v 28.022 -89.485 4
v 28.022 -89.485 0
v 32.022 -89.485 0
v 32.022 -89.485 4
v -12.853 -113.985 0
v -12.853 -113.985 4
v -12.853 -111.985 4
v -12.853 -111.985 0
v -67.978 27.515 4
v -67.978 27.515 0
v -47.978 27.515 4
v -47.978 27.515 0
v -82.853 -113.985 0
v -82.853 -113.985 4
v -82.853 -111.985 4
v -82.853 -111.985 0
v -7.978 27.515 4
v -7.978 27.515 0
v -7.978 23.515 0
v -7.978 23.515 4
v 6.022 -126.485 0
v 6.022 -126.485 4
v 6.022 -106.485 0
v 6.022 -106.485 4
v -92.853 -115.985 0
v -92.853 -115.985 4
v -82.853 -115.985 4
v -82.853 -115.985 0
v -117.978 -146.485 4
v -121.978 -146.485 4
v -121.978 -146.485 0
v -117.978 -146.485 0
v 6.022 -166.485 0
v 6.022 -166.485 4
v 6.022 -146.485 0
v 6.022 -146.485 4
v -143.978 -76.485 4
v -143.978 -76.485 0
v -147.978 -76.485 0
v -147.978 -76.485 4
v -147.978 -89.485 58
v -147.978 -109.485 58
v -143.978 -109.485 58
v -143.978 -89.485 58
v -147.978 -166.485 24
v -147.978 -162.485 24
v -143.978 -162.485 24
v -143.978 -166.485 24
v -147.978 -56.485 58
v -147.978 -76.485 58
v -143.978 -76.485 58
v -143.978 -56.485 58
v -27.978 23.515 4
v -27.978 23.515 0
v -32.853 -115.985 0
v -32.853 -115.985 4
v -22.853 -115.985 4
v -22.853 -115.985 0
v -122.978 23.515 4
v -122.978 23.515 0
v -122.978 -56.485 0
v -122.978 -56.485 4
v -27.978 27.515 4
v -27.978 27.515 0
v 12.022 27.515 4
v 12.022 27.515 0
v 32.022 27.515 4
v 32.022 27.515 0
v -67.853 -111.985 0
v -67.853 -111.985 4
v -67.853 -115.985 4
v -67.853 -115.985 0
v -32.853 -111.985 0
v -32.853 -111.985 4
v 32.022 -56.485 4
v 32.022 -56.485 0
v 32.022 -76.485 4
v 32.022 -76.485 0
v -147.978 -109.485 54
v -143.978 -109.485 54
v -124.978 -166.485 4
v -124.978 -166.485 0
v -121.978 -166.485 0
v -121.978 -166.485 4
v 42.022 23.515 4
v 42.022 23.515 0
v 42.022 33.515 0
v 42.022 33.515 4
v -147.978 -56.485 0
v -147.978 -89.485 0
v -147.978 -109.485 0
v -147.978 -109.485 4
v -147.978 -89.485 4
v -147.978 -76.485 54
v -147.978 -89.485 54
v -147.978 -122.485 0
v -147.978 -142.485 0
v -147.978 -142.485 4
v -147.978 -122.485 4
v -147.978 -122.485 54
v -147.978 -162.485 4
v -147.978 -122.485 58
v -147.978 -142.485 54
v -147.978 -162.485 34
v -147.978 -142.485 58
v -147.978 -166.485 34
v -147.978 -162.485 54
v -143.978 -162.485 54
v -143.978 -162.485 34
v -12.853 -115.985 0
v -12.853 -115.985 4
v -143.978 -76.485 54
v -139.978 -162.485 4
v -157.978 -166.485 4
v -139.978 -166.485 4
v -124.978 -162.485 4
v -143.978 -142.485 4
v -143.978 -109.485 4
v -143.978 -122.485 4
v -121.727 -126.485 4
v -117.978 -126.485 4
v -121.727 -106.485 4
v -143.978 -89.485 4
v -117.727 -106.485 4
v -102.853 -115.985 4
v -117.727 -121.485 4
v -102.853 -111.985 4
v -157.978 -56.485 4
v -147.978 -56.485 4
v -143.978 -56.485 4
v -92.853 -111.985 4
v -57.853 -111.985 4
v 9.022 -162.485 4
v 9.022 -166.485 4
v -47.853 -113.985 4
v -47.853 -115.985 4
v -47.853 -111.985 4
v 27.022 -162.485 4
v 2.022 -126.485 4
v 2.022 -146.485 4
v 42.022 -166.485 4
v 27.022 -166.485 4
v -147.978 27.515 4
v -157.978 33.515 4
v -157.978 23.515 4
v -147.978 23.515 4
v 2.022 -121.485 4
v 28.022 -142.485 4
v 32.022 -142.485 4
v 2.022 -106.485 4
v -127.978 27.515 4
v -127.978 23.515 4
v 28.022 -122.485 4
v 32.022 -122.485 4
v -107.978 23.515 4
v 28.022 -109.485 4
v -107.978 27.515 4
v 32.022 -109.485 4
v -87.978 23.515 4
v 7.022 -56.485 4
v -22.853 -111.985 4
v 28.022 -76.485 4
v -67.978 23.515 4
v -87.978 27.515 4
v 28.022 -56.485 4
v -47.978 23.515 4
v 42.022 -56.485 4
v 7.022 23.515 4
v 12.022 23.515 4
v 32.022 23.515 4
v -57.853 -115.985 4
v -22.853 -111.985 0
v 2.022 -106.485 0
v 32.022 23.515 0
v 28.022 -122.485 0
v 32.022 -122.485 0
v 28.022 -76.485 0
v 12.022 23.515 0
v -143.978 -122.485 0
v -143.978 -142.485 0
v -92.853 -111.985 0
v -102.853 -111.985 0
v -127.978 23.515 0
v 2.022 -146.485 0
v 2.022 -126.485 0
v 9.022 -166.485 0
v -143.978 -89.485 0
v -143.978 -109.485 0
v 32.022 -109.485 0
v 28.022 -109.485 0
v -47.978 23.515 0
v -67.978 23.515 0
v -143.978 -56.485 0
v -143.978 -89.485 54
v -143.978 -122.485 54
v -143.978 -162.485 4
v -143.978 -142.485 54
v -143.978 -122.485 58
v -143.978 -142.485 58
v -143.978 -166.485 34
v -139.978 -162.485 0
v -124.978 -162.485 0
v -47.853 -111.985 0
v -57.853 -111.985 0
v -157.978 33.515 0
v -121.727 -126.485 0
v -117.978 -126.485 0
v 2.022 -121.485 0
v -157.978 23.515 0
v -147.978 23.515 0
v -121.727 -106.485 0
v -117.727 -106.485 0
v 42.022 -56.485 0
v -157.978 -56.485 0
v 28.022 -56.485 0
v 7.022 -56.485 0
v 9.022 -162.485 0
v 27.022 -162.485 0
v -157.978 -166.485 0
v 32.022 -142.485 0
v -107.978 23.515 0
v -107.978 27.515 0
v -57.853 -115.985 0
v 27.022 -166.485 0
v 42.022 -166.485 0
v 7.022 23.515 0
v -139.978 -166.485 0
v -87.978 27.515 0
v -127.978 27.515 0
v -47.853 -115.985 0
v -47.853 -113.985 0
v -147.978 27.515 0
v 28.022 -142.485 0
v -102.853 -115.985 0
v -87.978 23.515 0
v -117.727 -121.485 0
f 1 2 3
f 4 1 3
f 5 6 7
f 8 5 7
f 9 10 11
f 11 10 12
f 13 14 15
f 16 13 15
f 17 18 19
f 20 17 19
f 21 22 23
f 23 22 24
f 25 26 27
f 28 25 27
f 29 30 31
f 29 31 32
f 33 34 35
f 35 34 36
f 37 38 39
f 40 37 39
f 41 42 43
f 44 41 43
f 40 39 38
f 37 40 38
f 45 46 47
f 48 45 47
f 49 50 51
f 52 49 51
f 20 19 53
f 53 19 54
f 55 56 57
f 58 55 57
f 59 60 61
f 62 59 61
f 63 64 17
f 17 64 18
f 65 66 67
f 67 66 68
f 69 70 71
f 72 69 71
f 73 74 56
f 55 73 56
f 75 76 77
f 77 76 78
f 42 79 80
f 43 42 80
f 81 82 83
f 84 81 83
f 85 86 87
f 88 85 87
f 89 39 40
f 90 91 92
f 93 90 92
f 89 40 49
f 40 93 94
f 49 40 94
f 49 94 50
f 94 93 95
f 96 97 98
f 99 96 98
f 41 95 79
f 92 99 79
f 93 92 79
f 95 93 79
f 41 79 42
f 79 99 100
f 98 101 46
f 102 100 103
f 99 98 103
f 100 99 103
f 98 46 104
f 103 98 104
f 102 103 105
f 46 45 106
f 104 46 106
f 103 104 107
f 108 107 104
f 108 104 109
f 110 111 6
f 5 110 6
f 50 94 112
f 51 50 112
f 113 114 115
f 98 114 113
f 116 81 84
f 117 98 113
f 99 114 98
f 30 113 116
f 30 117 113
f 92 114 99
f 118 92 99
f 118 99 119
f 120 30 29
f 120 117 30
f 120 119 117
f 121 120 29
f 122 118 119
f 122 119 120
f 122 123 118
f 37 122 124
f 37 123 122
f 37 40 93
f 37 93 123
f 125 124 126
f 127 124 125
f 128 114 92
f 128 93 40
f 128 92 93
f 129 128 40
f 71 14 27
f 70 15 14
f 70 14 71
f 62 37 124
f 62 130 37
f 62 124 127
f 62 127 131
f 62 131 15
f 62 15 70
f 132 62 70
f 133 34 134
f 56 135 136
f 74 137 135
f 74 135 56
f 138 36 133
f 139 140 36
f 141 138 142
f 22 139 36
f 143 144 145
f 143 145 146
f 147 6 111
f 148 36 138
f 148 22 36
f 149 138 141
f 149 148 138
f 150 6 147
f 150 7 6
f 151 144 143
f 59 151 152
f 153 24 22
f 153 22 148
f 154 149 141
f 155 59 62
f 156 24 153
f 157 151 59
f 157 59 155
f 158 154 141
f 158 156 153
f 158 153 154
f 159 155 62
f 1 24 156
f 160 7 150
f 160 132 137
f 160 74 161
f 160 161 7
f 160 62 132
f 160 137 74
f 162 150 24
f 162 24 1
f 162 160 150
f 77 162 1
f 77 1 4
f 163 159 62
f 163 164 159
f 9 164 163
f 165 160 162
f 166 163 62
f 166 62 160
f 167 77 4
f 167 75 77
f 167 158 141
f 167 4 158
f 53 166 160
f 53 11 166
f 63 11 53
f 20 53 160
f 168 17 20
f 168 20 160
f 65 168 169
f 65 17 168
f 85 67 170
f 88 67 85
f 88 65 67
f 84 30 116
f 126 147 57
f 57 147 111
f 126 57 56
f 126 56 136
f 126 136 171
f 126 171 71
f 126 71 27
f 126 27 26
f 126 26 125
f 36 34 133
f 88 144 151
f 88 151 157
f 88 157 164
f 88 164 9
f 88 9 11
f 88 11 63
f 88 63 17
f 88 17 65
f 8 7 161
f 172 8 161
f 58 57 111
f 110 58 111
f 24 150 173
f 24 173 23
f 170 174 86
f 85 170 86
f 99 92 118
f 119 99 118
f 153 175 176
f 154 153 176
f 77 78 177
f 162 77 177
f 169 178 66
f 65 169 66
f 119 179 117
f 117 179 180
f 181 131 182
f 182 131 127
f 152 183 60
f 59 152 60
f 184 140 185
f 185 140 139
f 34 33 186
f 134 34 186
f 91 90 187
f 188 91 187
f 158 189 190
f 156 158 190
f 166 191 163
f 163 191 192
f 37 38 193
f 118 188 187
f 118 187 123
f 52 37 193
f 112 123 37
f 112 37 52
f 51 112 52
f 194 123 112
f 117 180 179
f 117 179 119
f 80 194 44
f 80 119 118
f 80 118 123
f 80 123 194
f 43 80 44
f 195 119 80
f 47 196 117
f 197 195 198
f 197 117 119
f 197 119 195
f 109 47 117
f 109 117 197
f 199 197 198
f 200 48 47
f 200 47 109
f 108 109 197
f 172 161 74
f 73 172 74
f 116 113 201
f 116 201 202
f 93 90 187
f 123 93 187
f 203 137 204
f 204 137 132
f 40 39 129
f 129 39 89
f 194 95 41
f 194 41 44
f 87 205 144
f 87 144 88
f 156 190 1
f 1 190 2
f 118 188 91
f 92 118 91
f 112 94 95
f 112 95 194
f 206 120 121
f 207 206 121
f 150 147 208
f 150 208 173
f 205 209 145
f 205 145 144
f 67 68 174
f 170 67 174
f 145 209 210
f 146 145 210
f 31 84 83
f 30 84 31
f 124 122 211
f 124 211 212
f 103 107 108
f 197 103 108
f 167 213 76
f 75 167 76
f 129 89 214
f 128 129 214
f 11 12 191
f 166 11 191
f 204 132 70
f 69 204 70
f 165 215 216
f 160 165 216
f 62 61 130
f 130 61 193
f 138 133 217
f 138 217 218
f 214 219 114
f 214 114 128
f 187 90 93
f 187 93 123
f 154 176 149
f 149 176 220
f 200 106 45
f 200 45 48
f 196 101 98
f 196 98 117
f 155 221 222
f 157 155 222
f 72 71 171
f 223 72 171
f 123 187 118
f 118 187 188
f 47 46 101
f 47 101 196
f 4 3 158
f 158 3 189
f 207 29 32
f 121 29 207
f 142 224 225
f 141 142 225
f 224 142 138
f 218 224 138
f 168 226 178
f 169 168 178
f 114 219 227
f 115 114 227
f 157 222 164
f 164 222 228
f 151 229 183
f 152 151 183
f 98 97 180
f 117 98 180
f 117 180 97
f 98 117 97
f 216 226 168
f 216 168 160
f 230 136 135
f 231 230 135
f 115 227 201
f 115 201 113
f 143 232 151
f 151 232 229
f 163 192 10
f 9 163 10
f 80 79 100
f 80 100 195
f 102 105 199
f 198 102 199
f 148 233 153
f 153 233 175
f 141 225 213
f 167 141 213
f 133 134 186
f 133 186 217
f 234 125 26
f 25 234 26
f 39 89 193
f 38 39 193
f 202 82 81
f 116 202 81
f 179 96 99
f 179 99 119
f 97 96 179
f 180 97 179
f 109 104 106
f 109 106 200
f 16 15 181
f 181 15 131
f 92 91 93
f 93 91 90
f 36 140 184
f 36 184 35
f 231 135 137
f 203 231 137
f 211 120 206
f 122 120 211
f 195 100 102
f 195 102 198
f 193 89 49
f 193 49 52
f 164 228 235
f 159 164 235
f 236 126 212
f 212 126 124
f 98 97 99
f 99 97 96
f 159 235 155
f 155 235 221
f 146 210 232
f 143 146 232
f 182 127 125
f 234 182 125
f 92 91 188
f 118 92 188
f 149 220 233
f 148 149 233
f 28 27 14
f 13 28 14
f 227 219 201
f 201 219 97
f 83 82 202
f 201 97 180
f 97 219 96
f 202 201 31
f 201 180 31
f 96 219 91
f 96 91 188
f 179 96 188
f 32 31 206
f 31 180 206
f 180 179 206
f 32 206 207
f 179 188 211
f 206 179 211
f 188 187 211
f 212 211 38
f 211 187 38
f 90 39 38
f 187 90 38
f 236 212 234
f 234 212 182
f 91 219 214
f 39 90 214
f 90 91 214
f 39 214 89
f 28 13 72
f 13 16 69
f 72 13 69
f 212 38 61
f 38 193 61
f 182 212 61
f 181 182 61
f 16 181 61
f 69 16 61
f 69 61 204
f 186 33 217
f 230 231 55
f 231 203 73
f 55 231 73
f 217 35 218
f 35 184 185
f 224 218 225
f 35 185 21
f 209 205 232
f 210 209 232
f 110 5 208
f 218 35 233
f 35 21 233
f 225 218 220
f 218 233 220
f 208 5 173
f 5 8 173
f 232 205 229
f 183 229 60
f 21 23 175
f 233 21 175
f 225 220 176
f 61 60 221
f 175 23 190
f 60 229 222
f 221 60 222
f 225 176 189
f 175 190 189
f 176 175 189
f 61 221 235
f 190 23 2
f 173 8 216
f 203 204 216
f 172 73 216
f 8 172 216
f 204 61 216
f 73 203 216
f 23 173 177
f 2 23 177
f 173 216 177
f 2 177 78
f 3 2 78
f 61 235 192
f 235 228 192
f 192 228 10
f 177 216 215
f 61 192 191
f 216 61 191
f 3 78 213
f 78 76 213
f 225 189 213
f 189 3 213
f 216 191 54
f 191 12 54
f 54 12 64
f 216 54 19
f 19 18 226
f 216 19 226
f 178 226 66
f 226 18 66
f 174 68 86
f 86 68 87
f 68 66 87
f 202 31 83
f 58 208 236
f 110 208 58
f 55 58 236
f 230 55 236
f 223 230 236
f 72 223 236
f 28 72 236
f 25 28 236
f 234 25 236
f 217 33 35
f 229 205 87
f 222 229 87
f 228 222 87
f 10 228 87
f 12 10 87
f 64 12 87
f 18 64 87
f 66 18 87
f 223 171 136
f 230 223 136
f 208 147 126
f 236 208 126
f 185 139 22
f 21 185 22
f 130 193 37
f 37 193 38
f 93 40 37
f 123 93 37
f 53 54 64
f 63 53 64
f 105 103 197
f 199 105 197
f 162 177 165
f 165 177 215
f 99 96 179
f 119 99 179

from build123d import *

# Parameters (mm, degrees)
F0_W      = 200
F0_H      = 200
F1_DEPTH  = 4
F2_W      = 4
F2_H      = 20
F3_DEPTH  = 54
F4_W      = 60
F4_H      = 45
F5_DEPTH  = 25
F6_W      = 4
F6_H      = 20
F7_DEPTH  = 4
F11_W     = 4
F11_H     = 176
F12_DEPTH = 50
F13_W     = 70
F13_H     = 23
F14_DEPTH = 4
F15_W     = 4
F15_H     = 5
F16_DEPTH = 4
F17_W     = 15
F17_H     = 4
F18_DEPTH = 4
F19_W     = 4
F19_H     = 20
F20_DEPTH = 4
F21_W     = 18
F21_H     = 4
F21_W_2   = 4
F21_H_2   = 20
F22_DEPTH = 4
F25_DEPTH = 4
F26_W     = 4
F26_H     = 31
F27_DEPTH = 10
F28_W     = 10
F28_H     = 80
F28_W_2   = 25
F29_DEPTH = 25
F30_W     = 80
F30_H     = 31
F31_DEPTH = 25


# Not quite as in the source:
# - ends of sketch curves that miss each other by under 0.0002 mm in the source are joined


with BuildPart() as f1:
    # F0 (on Top) → F1 (new body)
    with BuildSketch(Plane.XY):
        with Locations((-57.977979065, -66.4845939098)):
            Rectangle(F0_W, F0_H)
        Polygon((-143.977979065, -122.4845939098), (-143.977979065, -132.4845939098), (-143.977979065, -142.4845939098), (-147.977979065, -142.4845939098), (-147.977979065, -132.4845939098), (-147.977979065, -122.4845939098), align=None, mode=Mode.SUBTRACT)
        Polygon((-147.977979065, -109.4845939098), (-147.977979065, -99.4845939098), (-147.977979065, -89.4845939098), (-143.977979065, -89.4845939098), (-143.977979065, -99.4845939098), (-143.977979065, -109.4845939098), align=None, mode=Mode.SUBTRACT)
        Polygon((-147.977979065, -66.4845939098), (-147.977979065, -56.4845939098), (-143.977979065, -56.4845939098), (-143.977979065, -66.4845939098), (-143.977979065, -76.4845939098), (-147.977979065, -76.4845939098), align=None, mode=Mode.SUBTRACT)
        Polygon((32.022020935, -122.4845939098), (32.022020935, -132.4845939098), (32.022020935, -142.4845939098), (28.022020935, -142.4845939098), (28.022020935, -132.4845939098), (28.022020935, -122.4845939098), align=None, mode=Mode.SUBTRACT)
        Polygon((32.022020935, -89.4845939098), (32.022020935, -99.4845939098), (32.022020935, -109.4845939098), (28.022020935, -109.4845939098), (28.022020935, -99.4845939098), (28.022020935, -89.4845939098), align=None, mode=Mode.SUBTRACT)
        Polygon((-127.977979065, 23.5154060902), (-137.977979065, 23.5154060902), (-147.977979065, 23.5154060902), (-147.977979065, 27.5154060902), (-137.977979065, 27.5154060902), (-127.977979065, 27.5154060902), align=None, mode=Mode.SUBTRACT)
        Polygon((-87.977979065, 23.5154060902), (-97.977979065, 23.5154060902), (-107.977979065, 23.5154060902), (-107.977979065, 27.5154060902), (-97.977979065, 27.5154060902), (-87.977979065, 27.5154060902), align=None, mode=Mode.SUBTRACT)
        Polygon((32.022020935, -66.4845939098), (32.022020935, -76.4845939098), (28.022020935, -76.4845939098), (28.022020935, -66.4845939098), (28.022020935, -56.4845939098), (32.022020935, -56.4845939098), align=None, mode=Mode.SUBTRACT)
        Polygon((-47.977979065, 23.5154060902), (-57.977979065, 23.5154060902), (-67.977979065, 23.5154060902), (-67.977979065, 27.5154060902), (-57.977979065, 27.5154060902), (-47.977979065, 27.5154060902), align=None, mode=Mode.SUBTRACT)
        Polygon((-7.977979065, 23.5154060902), (-17.977979065, 23.5154060902), (-27.977979065, 23.5154060902), (-27.977979065, 27.5154060902), (-17.977979065, 27.5154060902), (-7.977979065, 27.5154060902), align=None, mode=Mode.SUBTRACT)
        Polygon((32.022020935, 23.5154060902), (22.022020935, 23.5154060902), (12.022020935, 23.5154060902), (12.022020935, 27.5154060902), (22.022020935, 27.5154060902), (32.022020935, 27.5154060902), align=None, mode=Mode.SUBTRACT)
    extrude(amount=F1_DEPTH)

    # F4 (on face) → F5 (cut)
    with BuildSketch(Plane.XY.offset(4)):
        with Locations((-87.977979065, -143.9845939098)):
            Rectangle(F4_W, F4_H)
        with Locations((-27.977979065, -143.9845939098)):
            Rectangle(F4_W, F4_H)
    extrude(amount=-F5_DEPTH, mode=Mode.SUBTRACT)

    # F17 (on face) → F18 (cut)
    with BuildSketch(Plane.XZ.offset(166.4845939098)):
        with Locations((-132.477979065, 2)):
            Rectangle(F17_W, F17_H)
    extrude(amount=-F18_DEPTH, mode=Mode.SUBTRACT)

    # F19 (on face) → F20 (cut)
    with BuildSketch(Plane.XY.offset(4)):
        with Locations((-119.977979065, -156.4845939098)):
            Rectangle(F19_W, F19_H)
        with Locations((-119.7271731991, -116.4853802123)):
            Rectangle(F19_W, F19_H)
    extrude(amount=-F20_DEPTH, mode=Mode.SUBTRACT)

    # F21 (on face) → F22 (cut)
    with BuildSketch(Plane.XY.offset(4)):
        with Locations((18.022020935, -164.4845939098)):
            Rectangle(F21_W, F21_H)
        with Locations((4.022020935, -156.4845939098)):
            Rectangle(F21_W_2, F21_H_2)
        with Locations((4.022020935, -116.4845939098)):
            Rectangle(F21_W_2, F21_H_2)
    extrude(amount=-F22_DEPTH, mode=Mode.SUBTRACT)

    # F24 (on face) → F25 (cut, through all)
    with BuildSketch(Plane.XY.offset(4)):
        Polygon((-47.8525531523, -111.9846591607), (-57.8525531515, -111.9847904856), (-67.8525268865, -111.9847904854), (-67.8525268865, -113.9847904854), (-67.8525268865, -115.9847904854), (-57.8525268865, -115.9847904854), (-47.8525006224, -115.9846591603), (-47.8525268873, -113.9846591605), align=None)
        Polygon((-32.8525268865, -111.9847904854), (-32.8525268865, -113.9847904854), (-32.8525268865, -115.9847904854), (-22.8525268865, -115.9847904854), (-12.8525006224, -115.9846591603), (-12.8525268873, -113.9846591605), (-12.8525531523, -111.9846591607), (-22.8525531515, -111.9847904856), align=None)
        Polygon((-102.8525268865, -115.9847904854), (-92.8525268865, -115.9847904854), (-82.8525006224, -115.9846591603), (-82.8525268873, -113.9846591605), (-82.8525531523, -111.9846591607), (-92.8525531515, -111.9847904856), (-102.8525268865, -111.9847904854), (-102.8525268865, -113.9847904854), align=None)
    extrude(amount=-F25_DEPTH, mode=Mode.SUBTRACT)

    # F28 (on face) → F29 (cut)
    with BuildSketch(Plane(origin=(0, 0, 0), x_dir=(1, 0, 0), z_dir=(0, 0, -1))):
        with Locations((-152.977979065, 16.4845939098)):
            Rectangle(F28_W, F28_H)
        with Locations((-135.477979065, 16.4845939098)):
            Rectangle(F28_W_2, F28_H)
        with Locations((37.022020935, 16.4845939098)):
            Rectangle(F28_W, F28_H)
        with Locations((19.522020935, 16.4845939098)):
            Rectangle(F28_W_2, F28_H)
    extrude(amount=-F29_DEPTH, mode=Mode.SUBTRACT)


with BuildPart() as f3:
    # F2 (on face) → F3 (new body)
    with BuildSketch(Plane.XY.offset(4)):
        with Locations((-145.977979065, -66.4845939098)):
            Rectangle(F2_W, F2_H)
    extrude(amount=F3_DEPTH)

    # F6 (on face) → F7 (join)
    with BuildSketch(Plane(origin=(0, 0, 0), x_dir=(1, 0, 0), z_dir=(0, 0, -1))):
        with Locations((-145.977979065, 66.4845939098)):
            Rectangle(F6_W, F6_H)
    extrude(amount=-F7_DEPTH)

    # F10: union 



with BuildPart() as f3b:
    # F2 (on face) → F3, piece 2 (new body)
    with BuildSketch(Plane.XY.offset(4)):
        with Locations((-145.977979065, -31.4845939098)):
            Rectangle(F2_W, F2_H)
    extrude(amount=F3_DEPTH)


with BuildPart() as f3c:
    # F2 (on face) → F3, piece 3 (new body)
    with BuildSketch(Plane.XY.offset(4)):
        with Locations((-145.977979065, 3.5154060902)):
            Rectangle(F2_W, F2_H)
    extrude(amount=F3_DEPTH)


with BuildPart() as f3d:
    # F2 (on face) → F3, piece 4 (new body)
    with BuildSketch(Plane.XY.offset(4)):
        with Locations((-145.977979065, -99.4845939098)):
            Rectangle(F2_W, F2_H)
    extrude(amount=F3_DEPTH)

    # F6 (on face) → F7, piece 2 (join)
    with BuildSketch(Plane(origin=(0, 0, 0), x_dir=(1, 0, 0), z_dir=(0, 0, -1))):
        with Locations((-145.977979065, 99.4845939098)):
            Rectangle(F6_W, F6_H)
    extrude(amount=-F7_DEPTH)

    # F8: union 


with BuildPart() as f3e:
    # F2 (on face) → F3, piece 5 (new body)
    with BuildSketch(Plane.XY.offset(4)):
        with Locations((-145.977979065, -132.4845939098)):
            Rectangle(F2_W, F2_H)
    extrude(amount=F3_DEPTH)

    # F6 (on face) → F7, piece 3 (join)
    with BuildSketch(Plane(origin=(0, 0, 0), x_dir=(1, 0, 0), z_dir=(0, 0, -1))):
        with Locations((-145.977979065, 132.4845939098)):
            Rectangle(F6_W, F6_H)
    extrude(amount=-F7_DEPTH)

    # F9: union 


with BuildPart() as f3_1:
    add(f3.part)

    add(f3b.part)  # F12 merges F3b

    add(f3c.part)  # F12 merges F3c

    add(f3d.part)  # F12 merges F3d

    add(f3e.part)  # F12 merges F3e
    # F11 (on face) → F12 (join)
    with BuildSketch(Plane.XY.offset(4)):
        with Locations((-145.977979065, -74.4845939098)):
            Rectangle(F11_W, F11_H)
    extrude(amount=F12_DEPTH)

    # F13 (on face) → F14 (cut, through all)
    with BuildSketch(Plane(origin=(-147.977979065, 0, 0), x_dir=(0, -1, 0), z_dir=(-1, 0, 0))):
        with Locations((21.4845939098, 15.5)):
            Rectangle(F13_W, F13_H)
    extrude(amount=-F14_DEPTH, mode=Mode.SUBTRACT)

    # F15 (on face) → F16 (join)
    with BuildSketch(Plane.XZ.offset(162.4845939098)):
        with Locations((-145.977979065, 31.5)):
            Rectangle(F15_W, F15_H)
        with Locations((-145.977979065, 26.5)):
            Rectangle(F15_W, F15_H)
    extrude(amount=F16_DEPTH)

    # F26 (on face) → F27 (join)
    with BuildSketch(Plane(origin=(0, 13.5154060902, 0), x_dir=(-1, 0, 0), z_dir=(0, 1, 0))):
        with Locations((145.977979065, 42.5)):
            Rectangle(F26_W, F26_H)
    extrude(amount=F27_DEPTH)

    # F30 (on face) → F31 (cut)
    with BuildSketch(Plane.YZ.offset(-143.977979065)):
        with Locations((-16.4845939098, 42.5)):
            Rectangle(F30_W, F30_H)
    extrude(amount=-F31_DEPTH, mode=Mode.SUBTRACT)


solid = Compound([f1.part, f3_1.part])
